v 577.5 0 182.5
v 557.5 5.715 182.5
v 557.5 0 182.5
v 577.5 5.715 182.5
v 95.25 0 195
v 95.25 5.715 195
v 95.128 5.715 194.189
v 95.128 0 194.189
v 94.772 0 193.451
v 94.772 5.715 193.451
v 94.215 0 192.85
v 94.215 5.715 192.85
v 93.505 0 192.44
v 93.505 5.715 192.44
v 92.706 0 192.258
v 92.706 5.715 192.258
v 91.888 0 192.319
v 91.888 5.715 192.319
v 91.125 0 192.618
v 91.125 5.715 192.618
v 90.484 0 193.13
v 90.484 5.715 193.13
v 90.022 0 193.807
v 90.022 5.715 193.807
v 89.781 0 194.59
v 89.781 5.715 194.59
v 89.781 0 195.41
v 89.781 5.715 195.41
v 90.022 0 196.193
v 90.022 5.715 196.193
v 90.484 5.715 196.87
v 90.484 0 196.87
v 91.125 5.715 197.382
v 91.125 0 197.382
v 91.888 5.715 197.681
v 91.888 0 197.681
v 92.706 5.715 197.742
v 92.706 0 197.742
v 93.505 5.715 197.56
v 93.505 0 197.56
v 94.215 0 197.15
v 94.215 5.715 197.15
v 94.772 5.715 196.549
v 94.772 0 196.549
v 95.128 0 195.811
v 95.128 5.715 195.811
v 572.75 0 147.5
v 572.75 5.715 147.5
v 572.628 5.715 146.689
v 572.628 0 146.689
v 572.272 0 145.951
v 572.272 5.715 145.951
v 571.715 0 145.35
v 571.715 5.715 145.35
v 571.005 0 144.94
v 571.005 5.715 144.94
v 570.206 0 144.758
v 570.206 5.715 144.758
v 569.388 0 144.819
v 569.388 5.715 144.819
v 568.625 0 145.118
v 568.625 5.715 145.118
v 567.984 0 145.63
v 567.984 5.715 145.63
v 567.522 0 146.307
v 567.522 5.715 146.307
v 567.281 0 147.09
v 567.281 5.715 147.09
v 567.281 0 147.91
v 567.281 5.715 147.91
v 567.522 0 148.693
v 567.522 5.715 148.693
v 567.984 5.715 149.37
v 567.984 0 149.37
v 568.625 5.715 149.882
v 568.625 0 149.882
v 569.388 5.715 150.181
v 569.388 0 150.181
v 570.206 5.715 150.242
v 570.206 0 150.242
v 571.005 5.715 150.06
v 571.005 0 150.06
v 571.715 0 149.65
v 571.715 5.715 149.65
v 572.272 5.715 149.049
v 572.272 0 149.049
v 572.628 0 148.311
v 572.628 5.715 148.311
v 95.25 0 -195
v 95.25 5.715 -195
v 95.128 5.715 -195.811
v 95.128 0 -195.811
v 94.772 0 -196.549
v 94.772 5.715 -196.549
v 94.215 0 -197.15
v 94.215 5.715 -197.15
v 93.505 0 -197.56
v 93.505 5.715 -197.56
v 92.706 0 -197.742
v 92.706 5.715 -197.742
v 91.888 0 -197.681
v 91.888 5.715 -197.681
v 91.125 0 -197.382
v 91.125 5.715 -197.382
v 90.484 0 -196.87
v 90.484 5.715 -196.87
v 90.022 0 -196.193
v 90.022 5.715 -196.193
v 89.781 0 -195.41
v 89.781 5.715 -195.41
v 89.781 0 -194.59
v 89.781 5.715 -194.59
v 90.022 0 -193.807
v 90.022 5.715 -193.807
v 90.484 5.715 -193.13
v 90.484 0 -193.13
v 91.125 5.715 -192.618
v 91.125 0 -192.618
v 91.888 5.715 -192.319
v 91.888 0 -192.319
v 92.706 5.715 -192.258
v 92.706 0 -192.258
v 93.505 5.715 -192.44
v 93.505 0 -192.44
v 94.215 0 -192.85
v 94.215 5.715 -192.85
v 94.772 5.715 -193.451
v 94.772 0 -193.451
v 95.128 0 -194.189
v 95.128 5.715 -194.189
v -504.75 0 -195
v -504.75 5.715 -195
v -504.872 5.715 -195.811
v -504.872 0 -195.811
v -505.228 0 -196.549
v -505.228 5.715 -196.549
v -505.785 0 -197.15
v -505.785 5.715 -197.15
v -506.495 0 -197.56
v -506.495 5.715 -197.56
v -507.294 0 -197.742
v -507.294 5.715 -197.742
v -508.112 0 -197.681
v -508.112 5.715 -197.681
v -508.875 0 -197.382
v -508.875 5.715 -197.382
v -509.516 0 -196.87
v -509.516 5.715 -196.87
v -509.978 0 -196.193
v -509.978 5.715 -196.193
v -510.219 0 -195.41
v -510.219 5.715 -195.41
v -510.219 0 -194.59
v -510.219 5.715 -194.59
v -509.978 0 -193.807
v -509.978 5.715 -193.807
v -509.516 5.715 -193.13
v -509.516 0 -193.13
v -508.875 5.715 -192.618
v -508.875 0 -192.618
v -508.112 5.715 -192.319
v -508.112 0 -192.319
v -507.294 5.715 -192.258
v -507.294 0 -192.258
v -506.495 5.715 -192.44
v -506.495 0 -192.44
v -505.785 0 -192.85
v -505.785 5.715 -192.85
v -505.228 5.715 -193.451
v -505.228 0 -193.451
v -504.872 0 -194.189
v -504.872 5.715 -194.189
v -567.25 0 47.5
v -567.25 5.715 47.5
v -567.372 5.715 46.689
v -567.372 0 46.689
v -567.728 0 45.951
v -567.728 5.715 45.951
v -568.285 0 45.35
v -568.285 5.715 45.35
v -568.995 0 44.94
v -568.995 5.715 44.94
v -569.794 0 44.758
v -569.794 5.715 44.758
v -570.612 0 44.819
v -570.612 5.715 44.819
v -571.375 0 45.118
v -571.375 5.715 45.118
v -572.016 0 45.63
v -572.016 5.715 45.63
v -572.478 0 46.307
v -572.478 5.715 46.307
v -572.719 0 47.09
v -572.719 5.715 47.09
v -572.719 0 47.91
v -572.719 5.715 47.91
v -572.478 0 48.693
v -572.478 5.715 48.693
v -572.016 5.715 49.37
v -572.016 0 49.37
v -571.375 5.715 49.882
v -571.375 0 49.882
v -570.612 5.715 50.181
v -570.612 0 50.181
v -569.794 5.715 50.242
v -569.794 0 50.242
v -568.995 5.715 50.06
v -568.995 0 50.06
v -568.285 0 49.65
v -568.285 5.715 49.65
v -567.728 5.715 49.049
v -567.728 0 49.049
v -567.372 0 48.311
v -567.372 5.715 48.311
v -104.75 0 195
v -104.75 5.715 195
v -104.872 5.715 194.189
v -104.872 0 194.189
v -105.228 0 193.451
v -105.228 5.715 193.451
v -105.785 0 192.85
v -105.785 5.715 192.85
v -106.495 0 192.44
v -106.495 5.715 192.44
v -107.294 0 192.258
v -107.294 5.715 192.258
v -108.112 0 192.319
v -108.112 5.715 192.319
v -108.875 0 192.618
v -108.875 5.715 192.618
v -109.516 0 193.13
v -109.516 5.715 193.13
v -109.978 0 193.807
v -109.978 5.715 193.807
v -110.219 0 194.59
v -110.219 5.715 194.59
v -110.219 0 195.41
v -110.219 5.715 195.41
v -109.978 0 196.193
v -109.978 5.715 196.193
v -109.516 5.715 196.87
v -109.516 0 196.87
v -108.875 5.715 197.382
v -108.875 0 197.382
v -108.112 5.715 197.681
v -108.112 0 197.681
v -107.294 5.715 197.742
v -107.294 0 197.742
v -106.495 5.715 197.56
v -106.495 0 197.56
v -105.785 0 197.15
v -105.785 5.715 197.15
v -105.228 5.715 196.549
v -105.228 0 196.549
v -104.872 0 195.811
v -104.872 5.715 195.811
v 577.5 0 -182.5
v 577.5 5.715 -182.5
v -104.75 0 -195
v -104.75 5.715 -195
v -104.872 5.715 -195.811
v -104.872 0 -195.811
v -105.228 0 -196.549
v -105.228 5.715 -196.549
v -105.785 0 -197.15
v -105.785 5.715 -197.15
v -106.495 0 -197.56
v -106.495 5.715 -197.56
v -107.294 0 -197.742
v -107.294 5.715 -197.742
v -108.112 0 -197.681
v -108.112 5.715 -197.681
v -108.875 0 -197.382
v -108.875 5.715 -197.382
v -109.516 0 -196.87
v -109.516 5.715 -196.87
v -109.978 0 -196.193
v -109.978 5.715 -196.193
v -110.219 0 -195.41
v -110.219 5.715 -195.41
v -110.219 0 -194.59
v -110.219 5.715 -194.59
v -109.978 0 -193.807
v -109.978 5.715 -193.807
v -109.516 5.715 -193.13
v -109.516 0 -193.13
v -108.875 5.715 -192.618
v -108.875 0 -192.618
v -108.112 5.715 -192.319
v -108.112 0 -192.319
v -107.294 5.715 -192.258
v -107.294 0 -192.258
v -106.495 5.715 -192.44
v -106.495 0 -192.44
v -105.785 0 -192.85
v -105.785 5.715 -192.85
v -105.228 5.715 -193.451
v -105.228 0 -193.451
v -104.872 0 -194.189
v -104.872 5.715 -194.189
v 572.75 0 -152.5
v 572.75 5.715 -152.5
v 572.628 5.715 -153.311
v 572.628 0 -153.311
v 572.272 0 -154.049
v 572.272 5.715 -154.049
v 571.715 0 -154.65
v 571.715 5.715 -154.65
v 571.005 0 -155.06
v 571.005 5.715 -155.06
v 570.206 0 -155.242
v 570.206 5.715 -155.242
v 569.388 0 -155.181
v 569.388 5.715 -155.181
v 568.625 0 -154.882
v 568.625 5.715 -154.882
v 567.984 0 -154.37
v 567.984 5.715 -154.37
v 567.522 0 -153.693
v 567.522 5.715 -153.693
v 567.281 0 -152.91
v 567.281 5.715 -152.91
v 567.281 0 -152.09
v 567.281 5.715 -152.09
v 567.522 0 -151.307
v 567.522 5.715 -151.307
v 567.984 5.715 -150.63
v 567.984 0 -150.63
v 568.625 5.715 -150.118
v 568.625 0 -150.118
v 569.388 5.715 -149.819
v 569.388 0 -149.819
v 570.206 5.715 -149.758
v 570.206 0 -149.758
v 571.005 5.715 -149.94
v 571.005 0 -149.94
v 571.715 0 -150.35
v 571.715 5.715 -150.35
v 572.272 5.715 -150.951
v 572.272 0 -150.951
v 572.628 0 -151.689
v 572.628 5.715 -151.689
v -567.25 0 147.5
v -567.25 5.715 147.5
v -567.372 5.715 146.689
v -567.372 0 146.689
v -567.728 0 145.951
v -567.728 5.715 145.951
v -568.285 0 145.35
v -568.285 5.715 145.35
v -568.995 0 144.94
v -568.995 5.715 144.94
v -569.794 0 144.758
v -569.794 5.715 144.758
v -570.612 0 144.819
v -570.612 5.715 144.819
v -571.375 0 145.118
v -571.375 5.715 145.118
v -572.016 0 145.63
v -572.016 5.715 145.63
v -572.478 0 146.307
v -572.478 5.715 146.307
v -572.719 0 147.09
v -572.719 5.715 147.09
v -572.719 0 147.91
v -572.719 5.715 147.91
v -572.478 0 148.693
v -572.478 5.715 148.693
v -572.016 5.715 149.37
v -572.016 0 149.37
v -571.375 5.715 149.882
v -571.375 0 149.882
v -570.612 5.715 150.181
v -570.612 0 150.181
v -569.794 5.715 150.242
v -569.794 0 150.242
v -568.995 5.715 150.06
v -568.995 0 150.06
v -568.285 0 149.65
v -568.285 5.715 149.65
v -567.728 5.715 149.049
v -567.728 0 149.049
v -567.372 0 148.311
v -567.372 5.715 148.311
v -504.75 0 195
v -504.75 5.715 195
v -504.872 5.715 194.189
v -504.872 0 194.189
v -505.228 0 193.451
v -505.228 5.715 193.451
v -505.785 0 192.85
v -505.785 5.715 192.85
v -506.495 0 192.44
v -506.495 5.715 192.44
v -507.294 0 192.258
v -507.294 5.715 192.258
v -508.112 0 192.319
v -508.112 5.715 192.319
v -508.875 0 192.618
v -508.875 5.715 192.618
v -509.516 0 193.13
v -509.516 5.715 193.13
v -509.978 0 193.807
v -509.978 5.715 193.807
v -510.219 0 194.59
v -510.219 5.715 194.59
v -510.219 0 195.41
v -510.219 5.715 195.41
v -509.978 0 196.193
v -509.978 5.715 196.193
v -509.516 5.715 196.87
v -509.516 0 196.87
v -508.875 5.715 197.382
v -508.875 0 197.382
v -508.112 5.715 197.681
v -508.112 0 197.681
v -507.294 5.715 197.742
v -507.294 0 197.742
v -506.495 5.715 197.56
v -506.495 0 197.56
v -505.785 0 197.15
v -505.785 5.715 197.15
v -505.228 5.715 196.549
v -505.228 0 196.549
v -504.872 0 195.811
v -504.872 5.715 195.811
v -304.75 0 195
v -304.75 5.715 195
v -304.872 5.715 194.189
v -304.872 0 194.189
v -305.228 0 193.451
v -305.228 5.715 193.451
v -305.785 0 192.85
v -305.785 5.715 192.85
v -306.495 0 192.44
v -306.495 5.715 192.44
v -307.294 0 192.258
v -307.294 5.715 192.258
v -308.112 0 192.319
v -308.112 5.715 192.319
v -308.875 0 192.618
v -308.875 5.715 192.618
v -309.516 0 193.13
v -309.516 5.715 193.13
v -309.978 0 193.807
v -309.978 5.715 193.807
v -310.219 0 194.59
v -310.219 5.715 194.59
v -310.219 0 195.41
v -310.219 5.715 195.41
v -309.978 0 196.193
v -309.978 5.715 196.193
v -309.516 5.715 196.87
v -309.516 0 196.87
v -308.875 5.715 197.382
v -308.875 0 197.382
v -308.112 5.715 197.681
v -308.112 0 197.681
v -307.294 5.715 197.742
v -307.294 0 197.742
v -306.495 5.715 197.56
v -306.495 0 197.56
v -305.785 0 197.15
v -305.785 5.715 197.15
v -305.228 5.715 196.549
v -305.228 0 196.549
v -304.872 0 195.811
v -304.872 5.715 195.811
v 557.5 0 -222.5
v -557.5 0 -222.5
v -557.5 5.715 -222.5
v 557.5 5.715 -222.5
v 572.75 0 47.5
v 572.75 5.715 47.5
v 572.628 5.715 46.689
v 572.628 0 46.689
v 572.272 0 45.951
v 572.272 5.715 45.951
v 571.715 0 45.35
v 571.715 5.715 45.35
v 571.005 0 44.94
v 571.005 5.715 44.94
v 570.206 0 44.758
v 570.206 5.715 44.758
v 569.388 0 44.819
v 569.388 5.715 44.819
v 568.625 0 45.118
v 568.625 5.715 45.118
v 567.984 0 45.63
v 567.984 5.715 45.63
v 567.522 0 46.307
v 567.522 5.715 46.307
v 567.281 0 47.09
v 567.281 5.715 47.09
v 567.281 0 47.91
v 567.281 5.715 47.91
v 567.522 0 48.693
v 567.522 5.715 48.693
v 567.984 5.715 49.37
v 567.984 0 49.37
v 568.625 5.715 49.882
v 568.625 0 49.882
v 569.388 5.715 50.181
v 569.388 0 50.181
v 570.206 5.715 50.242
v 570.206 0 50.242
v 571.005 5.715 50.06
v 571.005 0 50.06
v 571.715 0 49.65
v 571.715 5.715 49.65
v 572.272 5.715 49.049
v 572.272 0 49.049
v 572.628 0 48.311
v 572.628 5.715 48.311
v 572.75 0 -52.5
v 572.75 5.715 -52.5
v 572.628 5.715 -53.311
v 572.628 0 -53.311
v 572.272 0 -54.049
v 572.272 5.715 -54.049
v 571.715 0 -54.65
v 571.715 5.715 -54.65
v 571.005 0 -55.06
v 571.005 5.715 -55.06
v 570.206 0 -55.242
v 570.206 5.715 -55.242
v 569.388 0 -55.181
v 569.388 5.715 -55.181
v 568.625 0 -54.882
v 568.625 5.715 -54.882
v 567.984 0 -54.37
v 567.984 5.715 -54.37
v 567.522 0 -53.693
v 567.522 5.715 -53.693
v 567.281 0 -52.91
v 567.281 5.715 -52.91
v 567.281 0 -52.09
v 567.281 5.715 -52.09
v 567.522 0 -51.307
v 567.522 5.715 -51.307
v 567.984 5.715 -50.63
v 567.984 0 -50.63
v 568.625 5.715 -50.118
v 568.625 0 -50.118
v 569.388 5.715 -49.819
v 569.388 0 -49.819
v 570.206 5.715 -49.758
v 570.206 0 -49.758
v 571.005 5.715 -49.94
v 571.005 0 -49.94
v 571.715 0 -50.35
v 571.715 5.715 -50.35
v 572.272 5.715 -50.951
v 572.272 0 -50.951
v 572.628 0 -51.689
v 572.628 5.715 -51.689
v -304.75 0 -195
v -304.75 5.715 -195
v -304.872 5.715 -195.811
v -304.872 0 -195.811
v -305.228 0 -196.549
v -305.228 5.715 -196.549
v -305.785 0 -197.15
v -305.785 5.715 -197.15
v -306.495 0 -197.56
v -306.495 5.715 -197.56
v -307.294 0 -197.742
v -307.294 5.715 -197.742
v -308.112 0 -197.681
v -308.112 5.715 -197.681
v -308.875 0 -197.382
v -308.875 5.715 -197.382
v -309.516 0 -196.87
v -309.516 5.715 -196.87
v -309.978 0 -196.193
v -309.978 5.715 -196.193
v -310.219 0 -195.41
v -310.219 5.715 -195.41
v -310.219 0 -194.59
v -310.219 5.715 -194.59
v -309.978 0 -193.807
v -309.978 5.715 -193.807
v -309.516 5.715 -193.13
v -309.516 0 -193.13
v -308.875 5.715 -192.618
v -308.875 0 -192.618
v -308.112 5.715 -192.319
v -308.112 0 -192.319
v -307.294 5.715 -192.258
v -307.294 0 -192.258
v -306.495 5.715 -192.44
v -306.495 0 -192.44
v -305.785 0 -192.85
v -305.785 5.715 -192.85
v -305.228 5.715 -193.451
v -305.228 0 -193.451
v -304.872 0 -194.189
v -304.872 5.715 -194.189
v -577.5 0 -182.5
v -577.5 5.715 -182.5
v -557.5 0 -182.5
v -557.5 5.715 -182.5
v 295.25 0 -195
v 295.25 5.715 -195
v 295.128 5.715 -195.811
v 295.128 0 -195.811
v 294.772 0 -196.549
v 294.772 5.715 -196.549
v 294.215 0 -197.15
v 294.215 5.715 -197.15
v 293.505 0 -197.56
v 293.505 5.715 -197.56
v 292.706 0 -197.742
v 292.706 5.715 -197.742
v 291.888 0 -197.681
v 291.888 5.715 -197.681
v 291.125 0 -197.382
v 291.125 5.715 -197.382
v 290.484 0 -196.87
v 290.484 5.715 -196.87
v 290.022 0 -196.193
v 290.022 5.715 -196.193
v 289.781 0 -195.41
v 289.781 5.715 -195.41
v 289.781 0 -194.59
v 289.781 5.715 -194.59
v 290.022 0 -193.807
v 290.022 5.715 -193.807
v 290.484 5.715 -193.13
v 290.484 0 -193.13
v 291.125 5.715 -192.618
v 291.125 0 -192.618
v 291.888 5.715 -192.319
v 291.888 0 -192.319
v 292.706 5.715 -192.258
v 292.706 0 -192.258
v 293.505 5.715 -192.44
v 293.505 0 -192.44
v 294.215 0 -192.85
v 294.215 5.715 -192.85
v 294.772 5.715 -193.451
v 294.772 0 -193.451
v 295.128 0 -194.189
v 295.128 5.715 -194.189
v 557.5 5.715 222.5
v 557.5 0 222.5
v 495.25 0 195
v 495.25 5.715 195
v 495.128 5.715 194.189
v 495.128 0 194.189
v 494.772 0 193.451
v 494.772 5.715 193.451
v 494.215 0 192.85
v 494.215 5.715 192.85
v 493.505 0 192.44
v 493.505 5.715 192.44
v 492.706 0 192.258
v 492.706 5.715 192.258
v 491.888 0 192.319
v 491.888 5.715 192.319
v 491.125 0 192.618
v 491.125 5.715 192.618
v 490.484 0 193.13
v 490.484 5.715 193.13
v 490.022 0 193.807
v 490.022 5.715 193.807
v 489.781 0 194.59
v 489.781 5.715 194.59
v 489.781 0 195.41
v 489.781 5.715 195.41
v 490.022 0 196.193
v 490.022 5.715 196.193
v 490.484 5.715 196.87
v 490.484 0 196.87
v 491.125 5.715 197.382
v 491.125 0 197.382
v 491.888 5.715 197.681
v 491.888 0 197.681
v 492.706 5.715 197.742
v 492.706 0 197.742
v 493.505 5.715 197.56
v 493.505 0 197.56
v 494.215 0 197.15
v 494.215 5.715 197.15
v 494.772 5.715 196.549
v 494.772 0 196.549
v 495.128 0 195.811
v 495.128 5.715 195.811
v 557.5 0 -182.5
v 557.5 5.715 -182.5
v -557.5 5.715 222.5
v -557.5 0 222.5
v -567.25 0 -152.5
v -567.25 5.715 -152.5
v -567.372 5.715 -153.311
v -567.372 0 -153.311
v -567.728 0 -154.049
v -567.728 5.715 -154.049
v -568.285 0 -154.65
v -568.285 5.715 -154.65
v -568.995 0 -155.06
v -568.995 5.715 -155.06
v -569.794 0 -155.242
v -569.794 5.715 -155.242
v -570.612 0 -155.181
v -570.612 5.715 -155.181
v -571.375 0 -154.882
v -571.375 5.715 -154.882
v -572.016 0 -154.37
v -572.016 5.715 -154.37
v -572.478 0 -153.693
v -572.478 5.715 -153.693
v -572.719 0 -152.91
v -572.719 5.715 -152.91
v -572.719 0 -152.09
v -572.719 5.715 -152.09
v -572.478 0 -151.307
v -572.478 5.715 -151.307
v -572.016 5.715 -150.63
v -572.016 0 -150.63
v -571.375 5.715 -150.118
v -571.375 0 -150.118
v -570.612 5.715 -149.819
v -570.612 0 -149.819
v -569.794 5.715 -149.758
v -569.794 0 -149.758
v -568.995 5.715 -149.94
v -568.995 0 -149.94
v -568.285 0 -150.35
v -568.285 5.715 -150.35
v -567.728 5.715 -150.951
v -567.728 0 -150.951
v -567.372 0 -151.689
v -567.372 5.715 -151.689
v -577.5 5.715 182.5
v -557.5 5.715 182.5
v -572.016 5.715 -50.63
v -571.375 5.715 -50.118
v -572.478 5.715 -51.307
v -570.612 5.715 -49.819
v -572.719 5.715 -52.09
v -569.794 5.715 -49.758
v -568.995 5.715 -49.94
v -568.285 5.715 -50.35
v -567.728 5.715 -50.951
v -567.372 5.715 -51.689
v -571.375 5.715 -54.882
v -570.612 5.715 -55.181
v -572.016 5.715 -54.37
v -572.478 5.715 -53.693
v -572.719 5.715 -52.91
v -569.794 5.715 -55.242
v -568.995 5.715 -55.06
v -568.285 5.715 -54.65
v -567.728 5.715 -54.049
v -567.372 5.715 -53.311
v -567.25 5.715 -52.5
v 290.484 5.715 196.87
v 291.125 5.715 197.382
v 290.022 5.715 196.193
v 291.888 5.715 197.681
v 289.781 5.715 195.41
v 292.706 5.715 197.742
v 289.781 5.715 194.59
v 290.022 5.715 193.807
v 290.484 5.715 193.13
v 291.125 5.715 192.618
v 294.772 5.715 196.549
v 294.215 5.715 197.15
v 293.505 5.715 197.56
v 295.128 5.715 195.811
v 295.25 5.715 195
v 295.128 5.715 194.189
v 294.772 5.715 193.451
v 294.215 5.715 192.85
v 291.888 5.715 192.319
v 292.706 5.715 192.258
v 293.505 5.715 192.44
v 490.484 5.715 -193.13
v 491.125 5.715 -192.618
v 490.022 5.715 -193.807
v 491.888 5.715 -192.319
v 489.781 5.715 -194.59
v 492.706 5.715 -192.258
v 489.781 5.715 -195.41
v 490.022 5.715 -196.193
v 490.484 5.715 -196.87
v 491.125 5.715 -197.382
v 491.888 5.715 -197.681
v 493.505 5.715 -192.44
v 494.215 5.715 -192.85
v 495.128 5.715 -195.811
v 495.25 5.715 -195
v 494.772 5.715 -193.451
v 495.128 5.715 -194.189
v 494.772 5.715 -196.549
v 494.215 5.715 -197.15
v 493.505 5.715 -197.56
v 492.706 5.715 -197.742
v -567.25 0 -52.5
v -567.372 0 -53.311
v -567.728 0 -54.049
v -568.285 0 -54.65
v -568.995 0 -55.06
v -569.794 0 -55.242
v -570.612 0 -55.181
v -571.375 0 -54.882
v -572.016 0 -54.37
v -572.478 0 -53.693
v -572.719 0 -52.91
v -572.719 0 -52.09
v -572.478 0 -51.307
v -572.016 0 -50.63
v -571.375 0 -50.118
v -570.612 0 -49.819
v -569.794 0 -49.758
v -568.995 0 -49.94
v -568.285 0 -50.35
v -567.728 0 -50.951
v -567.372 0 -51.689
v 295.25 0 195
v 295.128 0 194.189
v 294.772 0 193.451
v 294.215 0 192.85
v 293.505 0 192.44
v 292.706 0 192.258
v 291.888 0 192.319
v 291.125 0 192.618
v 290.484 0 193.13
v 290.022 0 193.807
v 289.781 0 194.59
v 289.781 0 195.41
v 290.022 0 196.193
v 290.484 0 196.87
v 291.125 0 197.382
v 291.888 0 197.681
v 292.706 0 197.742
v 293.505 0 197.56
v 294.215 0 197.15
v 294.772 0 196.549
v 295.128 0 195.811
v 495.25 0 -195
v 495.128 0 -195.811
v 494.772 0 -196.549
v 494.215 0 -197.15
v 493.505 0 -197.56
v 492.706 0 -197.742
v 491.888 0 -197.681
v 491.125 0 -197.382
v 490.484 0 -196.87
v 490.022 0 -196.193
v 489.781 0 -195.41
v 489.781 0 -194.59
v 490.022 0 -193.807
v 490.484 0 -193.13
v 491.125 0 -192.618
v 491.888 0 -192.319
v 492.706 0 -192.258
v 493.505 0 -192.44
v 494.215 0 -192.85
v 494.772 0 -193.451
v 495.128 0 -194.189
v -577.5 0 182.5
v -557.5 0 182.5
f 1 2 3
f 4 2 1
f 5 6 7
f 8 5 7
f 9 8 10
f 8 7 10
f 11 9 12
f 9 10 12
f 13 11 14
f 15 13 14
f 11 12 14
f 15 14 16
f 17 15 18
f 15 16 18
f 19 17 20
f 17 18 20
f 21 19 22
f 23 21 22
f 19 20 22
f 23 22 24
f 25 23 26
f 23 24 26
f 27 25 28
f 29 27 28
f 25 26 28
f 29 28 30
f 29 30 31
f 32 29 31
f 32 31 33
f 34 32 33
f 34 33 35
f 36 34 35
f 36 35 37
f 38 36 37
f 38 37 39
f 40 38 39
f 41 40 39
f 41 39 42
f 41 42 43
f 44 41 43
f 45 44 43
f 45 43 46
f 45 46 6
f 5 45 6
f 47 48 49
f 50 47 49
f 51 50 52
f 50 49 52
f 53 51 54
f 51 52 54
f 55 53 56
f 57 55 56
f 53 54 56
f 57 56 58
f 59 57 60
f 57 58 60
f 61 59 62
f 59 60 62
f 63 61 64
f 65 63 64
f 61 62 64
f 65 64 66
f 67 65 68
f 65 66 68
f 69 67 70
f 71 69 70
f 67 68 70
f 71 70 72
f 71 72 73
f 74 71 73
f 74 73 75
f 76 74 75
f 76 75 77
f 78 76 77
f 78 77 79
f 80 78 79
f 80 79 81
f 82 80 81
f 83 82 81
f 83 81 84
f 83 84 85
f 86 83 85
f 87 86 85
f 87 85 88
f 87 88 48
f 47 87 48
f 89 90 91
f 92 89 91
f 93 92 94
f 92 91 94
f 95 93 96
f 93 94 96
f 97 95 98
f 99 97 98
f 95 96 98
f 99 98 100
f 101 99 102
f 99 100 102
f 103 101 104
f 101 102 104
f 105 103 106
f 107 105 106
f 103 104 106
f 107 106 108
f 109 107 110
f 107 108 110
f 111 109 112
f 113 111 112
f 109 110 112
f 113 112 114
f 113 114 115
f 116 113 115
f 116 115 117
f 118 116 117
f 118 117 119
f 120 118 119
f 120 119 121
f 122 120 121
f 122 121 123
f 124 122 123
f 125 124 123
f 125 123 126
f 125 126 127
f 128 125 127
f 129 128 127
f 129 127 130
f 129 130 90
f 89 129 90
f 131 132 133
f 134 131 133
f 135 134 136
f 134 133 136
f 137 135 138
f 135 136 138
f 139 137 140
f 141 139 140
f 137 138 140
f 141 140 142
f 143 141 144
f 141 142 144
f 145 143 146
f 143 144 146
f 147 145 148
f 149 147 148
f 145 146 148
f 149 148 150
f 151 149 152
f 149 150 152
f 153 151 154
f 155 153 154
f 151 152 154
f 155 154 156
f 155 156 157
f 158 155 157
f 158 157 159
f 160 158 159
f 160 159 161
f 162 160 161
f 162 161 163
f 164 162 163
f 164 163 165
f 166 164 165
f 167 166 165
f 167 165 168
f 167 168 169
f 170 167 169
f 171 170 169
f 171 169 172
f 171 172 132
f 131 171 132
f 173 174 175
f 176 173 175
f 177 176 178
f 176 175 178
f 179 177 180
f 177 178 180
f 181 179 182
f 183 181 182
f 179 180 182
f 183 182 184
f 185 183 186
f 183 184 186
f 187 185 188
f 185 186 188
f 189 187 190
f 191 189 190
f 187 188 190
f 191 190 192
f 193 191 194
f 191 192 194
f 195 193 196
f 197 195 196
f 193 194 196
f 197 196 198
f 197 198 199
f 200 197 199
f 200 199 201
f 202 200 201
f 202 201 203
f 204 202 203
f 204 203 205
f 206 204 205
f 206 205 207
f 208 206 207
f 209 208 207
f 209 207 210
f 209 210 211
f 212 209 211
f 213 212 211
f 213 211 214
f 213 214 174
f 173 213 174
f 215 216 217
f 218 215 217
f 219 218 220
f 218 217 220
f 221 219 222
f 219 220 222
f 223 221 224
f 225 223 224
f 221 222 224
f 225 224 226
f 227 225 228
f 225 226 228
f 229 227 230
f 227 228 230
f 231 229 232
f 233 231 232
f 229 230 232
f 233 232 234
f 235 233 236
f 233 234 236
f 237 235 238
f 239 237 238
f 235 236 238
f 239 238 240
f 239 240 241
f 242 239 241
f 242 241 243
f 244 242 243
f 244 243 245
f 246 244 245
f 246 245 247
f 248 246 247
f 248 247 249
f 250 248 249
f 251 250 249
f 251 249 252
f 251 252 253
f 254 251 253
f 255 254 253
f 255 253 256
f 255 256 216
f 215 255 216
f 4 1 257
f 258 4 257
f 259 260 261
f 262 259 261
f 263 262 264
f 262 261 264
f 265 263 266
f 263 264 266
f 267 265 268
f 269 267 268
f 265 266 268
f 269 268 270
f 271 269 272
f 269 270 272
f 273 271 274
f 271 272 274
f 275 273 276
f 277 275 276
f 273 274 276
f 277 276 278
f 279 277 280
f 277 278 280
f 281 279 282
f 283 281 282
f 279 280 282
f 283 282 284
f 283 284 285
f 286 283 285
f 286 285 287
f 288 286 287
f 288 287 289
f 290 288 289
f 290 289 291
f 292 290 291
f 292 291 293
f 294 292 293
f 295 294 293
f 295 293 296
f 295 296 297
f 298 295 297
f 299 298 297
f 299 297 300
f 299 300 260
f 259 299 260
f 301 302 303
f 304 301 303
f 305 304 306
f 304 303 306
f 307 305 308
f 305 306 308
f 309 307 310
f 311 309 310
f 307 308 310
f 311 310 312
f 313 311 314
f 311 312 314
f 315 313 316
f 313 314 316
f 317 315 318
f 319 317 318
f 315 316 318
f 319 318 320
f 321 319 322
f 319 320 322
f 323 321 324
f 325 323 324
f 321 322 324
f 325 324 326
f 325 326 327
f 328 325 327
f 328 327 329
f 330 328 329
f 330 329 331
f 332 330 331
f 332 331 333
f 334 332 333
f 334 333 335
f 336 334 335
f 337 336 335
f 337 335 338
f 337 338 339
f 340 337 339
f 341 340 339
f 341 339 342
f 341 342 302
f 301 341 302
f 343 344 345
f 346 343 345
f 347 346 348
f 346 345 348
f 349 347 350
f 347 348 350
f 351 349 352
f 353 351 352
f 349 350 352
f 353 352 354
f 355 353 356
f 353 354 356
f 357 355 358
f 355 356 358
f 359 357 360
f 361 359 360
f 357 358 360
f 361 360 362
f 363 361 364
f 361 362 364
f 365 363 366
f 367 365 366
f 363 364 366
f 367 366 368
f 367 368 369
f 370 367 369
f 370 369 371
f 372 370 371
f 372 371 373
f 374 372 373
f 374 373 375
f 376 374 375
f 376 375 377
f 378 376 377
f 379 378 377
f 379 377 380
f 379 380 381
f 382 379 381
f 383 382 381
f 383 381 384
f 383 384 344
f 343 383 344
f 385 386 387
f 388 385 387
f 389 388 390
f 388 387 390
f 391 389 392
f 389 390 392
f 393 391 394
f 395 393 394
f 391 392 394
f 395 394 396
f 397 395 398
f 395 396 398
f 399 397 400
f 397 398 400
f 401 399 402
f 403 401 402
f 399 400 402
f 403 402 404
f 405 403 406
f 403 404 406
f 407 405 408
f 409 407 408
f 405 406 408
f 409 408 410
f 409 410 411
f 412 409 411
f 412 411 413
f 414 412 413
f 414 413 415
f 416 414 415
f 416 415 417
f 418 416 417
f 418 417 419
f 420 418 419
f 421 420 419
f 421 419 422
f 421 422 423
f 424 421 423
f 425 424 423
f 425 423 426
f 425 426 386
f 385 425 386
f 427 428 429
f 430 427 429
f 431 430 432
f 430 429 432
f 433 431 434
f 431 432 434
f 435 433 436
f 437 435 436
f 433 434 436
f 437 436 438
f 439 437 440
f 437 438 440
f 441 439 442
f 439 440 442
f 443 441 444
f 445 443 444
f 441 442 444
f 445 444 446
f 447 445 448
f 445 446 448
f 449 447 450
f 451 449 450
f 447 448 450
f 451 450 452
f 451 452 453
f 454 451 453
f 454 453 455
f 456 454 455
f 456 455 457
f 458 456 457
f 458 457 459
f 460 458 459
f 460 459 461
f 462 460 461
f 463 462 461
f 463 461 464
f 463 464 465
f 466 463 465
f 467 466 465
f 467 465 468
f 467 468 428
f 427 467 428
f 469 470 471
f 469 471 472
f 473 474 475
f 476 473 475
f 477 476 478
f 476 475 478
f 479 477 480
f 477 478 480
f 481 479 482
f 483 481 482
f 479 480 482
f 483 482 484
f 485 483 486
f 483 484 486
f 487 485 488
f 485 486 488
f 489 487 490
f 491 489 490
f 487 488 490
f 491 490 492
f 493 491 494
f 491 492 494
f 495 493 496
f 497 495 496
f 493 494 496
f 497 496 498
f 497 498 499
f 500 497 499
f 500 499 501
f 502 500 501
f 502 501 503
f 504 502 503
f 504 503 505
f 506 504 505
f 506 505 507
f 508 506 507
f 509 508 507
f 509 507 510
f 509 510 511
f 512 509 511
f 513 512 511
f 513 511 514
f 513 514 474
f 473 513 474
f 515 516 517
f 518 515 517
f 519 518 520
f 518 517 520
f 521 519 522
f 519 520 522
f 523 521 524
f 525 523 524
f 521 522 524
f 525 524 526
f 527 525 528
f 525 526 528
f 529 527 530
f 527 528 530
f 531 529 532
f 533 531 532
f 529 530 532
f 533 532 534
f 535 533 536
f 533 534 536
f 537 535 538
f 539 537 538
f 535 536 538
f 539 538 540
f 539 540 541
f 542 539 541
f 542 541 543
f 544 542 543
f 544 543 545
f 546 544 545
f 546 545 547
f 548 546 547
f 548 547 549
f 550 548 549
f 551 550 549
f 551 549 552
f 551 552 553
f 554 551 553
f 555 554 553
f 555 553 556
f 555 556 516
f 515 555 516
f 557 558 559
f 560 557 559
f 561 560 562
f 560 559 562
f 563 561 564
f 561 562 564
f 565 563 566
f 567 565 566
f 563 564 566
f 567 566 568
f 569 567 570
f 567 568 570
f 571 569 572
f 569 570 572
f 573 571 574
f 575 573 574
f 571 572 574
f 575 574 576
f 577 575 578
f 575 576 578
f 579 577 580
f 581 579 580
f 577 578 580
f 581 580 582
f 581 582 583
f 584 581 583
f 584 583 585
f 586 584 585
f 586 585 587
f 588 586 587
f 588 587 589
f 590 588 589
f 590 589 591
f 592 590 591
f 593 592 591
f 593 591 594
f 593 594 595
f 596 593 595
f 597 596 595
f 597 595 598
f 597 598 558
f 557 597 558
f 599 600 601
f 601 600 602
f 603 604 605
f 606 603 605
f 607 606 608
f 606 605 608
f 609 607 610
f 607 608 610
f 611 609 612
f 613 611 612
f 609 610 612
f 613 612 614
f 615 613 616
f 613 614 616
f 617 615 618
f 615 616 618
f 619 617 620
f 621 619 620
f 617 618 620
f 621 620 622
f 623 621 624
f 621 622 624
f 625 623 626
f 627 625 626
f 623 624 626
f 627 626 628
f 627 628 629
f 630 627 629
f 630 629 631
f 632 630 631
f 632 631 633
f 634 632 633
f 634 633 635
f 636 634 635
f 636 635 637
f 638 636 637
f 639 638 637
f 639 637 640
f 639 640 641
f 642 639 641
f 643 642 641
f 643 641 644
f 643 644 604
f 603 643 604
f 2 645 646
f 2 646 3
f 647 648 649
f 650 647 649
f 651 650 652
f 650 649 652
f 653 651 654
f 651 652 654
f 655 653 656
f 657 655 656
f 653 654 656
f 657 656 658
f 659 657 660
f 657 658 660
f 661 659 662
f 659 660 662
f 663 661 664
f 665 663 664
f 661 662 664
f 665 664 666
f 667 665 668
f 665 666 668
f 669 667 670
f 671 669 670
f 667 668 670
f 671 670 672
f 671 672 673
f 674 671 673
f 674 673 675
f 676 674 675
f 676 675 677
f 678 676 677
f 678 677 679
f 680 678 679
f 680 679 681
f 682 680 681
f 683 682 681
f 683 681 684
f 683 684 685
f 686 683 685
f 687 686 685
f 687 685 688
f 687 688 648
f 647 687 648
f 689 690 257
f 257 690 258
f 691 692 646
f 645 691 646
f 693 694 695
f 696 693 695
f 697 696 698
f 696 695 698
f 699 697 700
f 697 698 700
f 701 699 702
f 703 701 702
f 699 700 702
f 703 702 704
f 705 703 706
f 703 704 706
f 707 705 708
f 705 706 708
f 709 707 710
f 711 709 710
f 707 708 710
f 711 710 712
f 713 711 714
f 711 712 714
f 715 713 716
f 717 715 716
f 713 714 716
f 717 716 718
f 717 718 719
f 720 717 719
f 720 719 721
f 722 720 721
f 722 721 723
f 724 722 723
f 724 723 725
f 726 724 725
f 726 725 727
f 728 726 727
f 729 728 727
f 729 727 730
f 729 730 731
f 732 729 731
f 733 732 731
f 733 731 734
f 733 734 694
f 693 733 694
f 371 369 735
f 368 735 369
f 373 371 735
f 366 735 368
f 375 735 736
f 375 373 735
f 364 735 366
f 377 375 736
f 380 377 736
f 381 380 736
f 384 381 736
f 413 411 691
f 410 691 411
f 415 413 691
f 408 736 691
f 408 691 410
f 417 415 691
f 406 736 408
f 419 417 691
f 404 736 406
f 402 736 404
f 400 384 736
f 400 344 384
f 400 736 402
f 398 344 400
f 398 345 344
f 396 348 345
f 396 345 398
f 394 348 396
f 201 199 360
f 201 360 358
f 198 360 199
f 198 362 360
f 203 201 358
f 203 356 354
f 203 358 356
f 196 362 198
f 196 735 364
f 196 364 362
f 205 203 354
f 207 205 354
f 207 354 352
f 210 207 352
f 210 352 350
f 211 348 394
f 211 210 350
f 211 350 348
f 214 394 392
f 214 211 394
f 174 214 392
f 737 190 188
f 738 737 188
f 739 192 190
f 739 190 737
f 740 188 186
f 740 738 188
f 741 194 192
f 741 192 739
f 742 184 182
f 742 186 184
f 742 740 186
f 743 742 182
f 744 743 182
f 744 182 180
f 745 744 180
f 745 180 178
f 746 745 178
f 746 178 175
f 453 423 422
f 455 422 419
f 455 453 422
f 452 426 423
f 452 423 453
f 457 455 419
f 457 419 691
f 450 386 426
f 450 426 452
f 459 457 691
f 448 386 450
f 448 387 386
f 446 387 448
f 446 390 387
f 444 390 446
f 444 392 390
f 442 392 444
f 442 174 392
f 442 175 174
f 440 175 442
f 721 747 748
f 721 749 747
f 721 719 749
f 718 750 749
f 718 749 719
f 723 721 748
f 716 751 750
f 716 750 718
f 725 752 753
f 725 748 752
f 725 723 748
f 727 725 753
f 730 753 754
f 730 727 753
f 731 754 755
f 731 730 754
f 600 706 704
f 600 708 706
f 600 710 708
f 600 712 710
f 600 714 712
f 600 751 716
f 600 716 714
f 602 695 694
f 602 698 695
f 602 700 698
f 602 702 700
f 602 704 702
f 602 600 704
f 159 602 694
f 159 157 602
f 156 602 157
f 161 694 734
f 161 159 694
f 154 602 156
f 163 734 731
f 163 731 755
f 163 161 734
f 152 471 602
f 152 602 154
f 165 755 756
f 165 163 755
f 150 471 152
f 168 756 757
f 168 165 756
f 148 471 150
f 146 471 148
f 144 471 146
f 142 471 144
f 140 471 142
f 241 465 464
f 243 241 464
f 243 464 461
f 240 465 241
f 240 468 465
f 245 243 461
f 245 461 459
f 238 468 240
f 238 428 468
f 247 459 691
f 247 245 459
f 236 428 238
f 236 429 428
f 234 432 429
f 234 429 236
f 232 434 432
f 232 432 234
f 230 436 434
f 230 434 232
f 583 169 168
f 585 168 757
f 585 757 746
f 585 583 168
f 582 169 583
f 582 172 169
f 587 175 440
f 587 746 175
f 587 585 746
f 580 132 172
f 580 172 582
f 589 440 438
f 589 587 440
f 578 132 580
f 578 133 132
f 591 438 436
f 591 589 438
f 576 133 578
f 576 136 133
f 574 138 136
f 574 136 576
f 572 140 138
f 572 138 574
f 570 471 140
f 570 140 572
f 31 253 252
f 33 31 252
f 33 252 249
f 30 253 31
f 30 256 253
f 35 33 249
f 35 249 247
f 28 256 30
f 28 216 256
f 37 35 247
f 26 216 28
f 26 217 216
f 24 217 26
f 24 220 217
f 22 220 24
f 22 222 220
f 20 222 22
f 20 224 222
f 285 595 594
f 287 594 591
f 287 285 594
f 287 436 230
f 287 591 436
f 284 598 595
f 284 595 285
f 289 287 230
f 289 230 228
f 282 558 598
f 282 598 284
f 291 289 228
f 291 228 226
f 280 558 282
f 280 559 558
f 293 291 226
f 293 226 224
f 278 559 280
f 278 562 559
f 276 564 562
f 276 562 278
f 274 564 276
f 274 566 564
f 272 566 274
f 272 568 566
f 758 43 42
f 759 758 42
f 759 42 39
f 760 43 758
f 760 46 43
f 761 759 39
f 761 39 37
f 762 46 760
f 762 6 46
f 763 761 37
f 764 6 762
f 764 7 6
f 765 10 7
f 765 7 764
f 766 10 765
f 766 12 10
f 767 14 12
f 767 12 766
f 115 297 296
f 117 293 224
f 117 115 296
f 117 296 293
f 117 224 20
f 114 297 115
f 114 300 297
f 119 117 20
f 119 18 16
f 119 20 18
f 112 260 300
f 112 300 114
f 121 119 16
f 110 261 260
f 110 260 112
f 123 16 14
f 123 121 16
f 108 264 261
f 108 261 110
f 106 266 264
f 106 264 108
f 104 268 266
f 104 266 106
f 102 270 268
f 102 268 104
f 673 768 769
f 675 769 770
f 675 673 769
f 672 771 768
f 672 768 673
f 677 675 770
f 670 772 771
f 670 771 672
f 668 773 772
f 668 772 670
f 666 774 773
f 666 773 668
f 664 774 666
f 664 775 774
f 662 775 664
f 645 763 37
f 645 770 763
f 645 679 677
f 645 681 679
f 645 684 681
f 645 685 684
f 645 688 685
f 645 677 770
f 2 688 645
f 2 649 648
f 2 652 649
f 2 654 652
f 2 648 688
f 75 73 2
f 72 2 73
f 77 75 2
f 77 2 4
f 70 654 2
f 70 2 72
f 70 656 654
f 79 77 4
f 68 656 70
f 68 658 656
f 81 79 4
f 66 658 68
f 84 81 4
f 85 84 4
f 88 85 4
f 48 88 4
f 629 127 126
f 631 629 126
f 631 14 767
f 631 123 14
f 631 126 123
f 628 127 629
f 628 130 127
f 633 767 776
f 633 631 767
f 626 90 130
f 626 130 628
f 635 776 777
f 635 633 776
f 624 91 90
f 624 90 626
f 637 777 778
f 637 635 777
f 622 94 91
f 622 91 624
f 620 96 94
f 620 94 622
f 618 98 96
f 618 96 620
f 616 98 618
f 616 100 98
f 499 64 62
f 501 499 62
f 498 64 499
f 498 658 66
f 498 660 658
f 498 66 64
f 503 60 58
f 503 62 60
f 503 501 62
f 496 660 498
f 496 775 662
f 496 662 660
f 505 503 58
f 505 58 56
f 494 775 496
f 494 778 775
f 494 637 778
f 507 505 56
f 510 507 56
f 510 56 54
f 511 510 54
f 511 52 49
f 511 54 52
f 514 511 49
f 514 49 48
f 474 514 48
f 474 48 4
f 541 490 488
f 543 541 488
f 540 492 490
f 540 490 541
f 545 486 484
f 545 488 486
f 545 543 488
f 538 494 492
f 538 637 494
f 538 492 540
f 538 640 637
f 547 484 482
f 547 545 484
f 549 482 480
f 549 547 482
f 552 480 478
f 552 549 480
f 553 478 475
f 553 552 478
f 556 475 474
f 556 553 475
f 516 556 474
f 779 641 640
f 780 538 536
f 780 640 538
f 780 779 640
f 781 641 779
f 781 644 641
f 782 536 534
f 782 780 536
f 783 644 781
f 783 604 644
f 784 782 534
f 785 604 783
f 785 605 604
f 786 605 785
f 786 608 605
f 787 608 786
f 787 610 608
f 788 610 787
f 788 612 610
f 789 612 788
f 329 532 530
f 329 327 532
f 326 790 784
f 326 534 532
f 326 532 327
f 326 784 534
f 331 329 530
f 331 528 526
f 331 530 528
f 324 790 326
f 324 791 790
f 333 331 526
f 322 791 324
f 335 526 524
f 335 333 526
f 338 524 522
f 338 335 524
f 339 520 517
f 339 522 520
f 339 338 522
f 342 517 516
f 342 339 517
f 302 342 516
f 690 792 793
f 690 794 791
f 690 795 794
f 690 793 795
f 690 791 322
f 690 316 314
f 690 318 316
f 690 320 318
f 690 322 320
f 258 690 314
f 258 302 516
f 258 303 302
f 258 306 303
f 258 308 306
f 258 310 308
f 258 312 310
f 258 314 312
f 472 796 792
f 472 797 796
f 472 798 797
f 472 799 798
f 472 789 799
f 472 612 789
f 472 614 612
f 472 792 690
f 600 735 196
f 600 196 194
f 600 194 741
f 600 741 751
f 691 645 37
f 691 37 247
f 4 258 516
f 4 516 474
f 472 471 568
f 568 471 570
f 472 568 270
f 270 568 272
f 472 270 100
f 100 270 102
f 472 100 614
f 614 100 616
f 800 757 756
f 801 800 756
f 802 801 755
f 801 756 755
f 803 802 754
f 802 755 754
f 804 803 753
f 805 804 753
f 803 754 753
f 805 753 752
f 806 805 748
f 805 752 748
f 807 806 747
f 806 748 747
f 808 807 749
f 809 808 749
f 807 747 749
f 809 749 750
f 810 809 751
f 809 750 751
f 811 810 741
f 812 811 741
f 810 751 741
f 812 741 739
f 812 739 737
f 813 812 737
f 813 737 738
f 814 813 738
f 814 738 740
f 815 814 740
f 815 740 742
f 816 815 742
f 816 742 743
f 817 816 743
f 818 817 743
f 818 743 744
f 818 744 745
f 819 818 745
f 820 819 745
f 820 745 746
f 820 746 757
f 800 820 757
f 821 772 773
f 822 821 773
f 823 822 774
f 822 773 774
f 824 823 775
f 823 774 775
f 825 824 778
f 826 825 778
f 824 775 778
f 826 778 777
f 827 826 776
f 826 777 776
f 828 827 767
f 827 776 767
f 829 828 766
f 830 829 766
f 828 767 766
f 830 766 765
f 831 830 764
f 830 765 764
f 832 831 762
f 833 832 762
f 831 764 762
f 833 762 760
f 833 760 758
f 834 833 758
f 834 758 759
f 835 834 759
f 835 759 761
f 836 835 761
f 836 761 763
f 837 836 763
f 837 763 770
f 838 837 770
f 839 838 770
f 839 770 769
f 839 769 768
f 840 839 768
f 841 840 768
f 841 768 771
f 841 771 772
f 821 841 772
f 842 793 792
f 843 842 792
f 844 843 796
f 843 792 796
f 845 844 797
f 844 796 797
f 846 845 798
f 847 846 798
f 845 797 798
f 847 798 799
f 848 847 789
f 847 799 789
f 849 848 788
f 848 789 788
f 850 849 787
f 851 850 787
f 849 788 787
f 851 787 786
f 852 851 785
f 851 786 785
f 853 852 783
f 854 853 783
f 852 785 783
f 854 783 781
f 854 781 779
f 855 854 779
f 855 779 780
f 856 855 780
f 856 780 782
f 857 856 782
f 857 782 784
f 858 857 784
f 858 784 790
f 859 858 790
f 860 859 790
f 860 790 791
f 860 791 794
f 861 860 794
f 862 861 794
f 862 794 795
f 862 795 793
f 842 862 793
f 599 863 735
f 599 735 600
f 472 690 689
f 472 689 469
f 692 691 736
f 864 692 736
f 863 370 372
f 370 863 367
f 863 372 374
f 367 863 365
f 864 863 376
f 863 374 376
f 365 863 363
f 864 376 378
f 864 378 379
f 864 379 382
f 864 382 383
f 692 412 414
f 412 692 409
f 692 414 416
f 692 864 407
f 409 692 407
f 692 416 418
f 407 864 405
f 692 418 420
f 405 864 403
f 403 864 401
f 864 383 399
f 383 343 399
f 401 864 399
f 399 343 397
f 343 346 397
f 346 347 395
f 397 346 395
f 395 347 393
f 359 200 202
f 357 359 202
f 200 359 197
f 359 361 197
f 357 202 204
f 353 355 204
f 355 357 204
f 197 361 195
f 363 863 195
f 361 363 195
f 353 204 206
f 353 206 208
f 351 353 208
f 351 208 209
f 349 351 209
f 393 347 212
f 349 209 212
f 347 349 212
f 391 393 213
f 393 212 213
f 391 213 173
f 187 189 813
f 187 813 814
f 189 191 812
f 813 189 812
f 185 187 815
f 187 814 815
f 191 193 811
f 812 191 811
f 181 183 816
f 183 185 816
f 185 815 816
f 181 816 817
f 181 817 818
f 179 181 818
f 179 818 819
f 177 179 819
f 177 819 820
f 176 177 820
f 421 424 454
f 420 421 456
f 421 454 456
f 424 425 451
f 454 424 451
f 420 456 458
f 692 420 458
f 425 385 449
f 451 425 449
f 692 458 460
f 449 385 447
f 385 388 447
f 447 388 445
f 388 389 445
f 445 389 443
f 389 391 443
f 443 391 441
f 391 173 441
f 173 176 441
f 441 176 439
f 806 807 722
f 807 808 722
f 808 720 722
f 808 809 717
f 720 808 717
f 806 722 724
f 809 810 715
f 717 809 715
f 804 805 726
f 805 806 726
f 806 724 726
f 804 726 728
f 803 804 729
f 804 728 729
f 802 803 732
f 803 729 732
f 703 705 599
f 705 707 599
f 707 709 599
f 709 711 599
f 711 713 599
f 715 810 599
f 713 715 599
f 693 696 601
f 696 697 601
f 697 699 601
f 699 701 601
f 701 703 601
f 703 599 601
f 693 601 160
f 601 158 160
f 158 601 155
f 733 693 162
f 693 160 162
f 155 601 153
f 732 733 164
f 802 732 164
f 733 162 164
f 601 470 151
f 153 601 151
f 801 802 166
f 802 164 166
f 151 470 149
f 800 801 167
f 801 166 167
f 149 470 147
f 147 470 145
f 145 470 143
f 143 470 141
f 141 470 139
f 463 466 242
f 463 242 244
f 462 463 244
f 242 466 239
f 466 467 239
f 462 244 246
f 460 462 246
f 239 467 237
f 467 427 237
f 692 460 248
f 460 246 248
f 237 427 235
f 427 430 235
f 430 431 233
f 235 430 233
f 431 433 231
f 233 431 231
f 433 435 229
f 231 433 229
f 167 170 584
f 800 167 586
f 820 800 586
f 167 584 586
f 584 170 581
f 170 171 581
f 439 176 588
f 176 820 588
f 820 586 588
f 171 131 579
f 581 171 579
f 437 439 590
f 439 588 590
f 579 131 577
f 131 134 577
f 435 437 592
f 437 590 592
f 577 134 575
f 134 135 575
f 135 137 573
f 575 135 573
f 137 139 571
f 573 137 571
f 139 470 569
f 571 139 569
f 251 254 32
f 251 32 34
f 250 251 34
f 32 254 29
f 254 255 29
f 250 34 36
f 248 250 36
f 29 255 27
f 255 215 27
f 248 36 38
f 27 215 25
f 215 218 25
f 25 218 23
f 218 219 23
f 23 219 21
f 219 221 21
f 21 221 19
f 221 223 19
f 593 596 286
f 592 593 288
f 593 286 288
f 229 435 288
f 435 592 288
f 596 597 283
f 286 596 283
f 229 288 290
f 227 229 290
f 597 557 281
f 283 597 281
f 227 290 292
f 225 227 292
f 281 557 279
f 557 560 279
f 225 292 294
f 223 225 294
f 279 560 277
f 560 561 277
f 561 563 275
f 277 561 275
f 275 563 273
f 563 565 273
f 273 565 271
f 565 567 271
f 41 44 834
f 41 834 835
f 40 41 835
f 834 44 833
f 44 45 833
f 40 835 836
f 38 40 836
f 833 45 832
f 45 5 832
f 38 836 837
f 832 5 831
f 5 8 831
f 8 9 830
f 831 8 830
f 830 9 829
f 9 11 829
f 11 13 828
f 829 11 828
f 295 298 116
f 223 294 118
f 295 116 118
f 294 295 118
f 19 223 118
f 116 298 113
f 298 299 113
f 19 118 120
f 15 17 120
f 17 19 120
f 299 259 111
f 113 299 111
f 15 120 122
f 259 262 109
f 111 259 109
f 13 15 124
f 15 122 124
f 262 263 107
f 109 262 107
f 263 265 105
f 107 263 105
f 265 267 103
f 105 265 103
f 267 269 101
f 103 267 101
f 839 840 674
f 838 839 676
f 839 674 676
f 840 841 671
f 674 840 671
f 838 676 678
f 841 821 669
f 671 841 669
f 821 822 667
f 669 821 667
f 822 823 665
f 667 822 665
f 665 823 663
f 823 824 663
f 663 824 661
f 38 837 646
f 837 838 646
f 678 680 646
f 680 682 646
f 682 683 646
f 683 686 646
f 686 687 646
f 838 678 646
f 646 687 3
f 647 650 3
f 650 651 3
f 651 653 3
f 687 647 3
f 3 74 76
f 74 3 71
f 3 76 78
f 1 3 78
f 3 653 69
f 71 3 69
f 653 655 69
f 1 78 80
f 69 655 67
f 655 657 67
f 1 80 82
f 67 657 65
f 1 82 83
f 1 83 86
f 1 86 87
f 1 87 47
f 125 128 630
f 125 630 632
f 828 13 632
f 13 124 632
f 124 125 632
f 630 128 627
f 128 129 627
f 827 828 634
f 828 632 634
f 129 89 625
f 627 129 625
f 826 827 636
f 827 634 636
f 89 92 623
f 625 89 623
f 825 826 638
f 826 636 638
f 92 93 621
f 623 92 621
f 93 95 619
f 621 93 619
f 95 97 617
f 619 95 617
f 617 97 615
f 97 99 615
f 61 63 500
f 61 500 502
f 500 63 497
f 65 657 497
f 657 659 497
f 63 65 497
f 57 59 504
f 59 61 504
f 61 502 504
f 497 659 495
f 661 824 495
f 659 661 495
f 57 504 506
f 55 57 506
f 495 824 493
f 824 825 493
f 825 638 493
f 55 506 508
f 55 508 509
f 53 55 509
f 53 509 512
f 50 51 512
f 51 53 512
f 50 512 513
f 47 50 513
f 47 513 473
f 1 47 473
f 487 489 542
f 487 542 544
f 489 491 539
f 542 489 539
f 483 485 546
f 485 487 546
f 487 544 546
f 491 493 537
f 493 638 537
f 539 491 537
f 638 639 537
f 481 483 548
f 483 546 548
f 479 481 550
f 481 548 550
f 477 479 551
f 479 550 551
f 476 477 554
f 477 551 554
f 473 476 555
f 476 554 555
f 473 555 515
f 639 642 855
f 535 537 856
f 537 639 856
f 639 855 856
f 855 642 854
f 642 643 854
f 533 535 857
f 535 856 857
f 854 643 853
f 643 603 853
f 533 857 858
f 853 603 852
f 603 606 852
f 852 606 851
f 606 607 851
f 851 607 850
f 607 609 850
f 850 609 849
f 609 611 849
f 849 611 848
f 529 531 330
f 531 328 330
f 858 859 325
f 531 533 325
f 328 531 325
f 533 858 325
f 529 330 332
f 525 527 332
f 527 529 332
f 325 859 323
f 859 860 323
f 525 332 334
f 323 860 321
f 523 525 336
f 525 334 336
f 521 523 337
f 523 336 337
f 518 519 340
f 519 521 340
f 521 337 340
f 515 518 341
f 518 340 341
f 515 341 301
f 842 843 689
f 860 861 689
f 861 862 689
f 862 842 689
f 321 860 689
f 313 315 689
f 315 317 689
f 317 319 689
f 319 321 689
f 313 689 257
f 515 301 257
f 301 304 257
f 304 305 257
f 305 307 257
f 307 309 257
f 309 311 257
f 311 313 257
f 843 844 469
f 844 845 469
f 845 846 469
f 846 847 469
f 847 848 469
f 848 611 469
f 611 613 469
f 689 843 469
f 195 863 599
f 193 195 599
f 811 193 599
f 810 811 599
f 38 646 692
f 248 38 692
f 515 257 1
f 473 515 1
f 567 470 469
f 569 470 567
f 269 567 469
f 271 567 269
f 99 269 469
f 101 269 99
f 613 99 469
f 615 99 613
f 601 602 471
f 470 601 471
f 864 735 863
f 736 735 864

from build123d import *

# Parameters (mm, degrees)
SKETCH1_W           = 1155
SKETCH1_H           = 445
BOSS_EXTRUDE1_DEPTH = 5.715
SKETCH2_W           = 20
SKETCH2_H           = 40
CUT_EXTRUDE1_DEPTH  = 6.715
SKETCH3_R           = 2.75
CUT_EXTRUDE2_DEPTH  = 6.715


with BuildPart() as part:
    # Sketch1 → Boss-Extrude1 (new body)
    with BuildSketch(Plane(origin=(0, 0, 0), x_dir=(1, 0, 0), z_dir=(0, 1, 0))):
        Rectangle(SKETCH1_W, SKETCH1_H)
    extrude(amount=BOSS_EXTRUDE1_DEPTH)

    # Sketch2 → Cut-Extrude1 (cut, through all)
    with BuildSketch(Plane(origin=(0, 5.715, 0), x_dir=(1, 0, 0), z_dir=(0, 1, 0))):
        with Locations((-567.5, 202.5)):
            Rectangle(SKETCH2_W, SKETCH2_H)
        with Locations((-567.5, -202.5)):
            Rectangle(SKETCH2_W, SKETCH2_H)
        with Locations((567.5, -202.5)):
            Rectangle(SKETCH2_W, SKETCH2_H)
        with Locations((567.5, 202.5)):
            Rectangle(SKETCH2_W, SKETCH2_H)
    extrude(amount=-CUT_EXTRUDE1_DEPTH, mode=Mode.SUBTRACT)

    # Sketch3 → Cut-Extrude2 (cut, through all)
    with BuildSketch(Plane(origin=(0, 5.715, 0), x_dir=(1, 0, 0), z_dir=(0, 1, 0))):
        with Locations((-507.5, 195)):
            Circle(SKETCH3_R)
        with Locations((-570, 152.5)):
            Circle(SKETCH3_R)
        with Locations((-307.5, 195)):
            Circle(SKETCH3_R)
        with Locations((-107.5, 195)):
            Circle(SKETCH3_R)
        with Locations((92.5, 195)):
            Circle(SKETCH3_R)
        with Locations((292.5, 195)):
            Circle(SKETCH3_R)
        with Locations((492.5, 195)):
            Circle(SKETCH3_R)
        with Locations((-570, 52.5)):
            Circle(SKETCH3_R)
        with Locations((-570, -47.5)):
            Circle(SKETCH3_R)
        with Locations((-570, -147.5)):
            Circle(SKETCH3_R)
        with Locations((492.5, -195)):
            Circle(SKETCH3_R)
        with Locations((292.5, -195)):
            Circle(SKETCH3_R)
        with Locations((92.5, -195)):
            Circle(SKETCH3_R)
        with Locations((-107.5, -195)):
            Circle(SKETCH3_R)
        with Locations((-307.5, -195)):
            Circle(SKETCH3_R)
        with Locations((-507.5, -195)):
            Circle(SKETCH3_R)
        with Locations((570, -147.5)):
            Circle(SKETCH3_R)
        with Locations((570, -47.5)):
            Circle(SKETCH3_R)
        with Locations((570, 52.5)):
            Circle(SKETCH3_R)
        with Locations((570, 152.5)):
            Circle(SKETCH3_R)
    extrude(amount=-CUT_EXTRUDE2_DEPTH, mode=Mode.SUBTRACT)


solid = part.part
